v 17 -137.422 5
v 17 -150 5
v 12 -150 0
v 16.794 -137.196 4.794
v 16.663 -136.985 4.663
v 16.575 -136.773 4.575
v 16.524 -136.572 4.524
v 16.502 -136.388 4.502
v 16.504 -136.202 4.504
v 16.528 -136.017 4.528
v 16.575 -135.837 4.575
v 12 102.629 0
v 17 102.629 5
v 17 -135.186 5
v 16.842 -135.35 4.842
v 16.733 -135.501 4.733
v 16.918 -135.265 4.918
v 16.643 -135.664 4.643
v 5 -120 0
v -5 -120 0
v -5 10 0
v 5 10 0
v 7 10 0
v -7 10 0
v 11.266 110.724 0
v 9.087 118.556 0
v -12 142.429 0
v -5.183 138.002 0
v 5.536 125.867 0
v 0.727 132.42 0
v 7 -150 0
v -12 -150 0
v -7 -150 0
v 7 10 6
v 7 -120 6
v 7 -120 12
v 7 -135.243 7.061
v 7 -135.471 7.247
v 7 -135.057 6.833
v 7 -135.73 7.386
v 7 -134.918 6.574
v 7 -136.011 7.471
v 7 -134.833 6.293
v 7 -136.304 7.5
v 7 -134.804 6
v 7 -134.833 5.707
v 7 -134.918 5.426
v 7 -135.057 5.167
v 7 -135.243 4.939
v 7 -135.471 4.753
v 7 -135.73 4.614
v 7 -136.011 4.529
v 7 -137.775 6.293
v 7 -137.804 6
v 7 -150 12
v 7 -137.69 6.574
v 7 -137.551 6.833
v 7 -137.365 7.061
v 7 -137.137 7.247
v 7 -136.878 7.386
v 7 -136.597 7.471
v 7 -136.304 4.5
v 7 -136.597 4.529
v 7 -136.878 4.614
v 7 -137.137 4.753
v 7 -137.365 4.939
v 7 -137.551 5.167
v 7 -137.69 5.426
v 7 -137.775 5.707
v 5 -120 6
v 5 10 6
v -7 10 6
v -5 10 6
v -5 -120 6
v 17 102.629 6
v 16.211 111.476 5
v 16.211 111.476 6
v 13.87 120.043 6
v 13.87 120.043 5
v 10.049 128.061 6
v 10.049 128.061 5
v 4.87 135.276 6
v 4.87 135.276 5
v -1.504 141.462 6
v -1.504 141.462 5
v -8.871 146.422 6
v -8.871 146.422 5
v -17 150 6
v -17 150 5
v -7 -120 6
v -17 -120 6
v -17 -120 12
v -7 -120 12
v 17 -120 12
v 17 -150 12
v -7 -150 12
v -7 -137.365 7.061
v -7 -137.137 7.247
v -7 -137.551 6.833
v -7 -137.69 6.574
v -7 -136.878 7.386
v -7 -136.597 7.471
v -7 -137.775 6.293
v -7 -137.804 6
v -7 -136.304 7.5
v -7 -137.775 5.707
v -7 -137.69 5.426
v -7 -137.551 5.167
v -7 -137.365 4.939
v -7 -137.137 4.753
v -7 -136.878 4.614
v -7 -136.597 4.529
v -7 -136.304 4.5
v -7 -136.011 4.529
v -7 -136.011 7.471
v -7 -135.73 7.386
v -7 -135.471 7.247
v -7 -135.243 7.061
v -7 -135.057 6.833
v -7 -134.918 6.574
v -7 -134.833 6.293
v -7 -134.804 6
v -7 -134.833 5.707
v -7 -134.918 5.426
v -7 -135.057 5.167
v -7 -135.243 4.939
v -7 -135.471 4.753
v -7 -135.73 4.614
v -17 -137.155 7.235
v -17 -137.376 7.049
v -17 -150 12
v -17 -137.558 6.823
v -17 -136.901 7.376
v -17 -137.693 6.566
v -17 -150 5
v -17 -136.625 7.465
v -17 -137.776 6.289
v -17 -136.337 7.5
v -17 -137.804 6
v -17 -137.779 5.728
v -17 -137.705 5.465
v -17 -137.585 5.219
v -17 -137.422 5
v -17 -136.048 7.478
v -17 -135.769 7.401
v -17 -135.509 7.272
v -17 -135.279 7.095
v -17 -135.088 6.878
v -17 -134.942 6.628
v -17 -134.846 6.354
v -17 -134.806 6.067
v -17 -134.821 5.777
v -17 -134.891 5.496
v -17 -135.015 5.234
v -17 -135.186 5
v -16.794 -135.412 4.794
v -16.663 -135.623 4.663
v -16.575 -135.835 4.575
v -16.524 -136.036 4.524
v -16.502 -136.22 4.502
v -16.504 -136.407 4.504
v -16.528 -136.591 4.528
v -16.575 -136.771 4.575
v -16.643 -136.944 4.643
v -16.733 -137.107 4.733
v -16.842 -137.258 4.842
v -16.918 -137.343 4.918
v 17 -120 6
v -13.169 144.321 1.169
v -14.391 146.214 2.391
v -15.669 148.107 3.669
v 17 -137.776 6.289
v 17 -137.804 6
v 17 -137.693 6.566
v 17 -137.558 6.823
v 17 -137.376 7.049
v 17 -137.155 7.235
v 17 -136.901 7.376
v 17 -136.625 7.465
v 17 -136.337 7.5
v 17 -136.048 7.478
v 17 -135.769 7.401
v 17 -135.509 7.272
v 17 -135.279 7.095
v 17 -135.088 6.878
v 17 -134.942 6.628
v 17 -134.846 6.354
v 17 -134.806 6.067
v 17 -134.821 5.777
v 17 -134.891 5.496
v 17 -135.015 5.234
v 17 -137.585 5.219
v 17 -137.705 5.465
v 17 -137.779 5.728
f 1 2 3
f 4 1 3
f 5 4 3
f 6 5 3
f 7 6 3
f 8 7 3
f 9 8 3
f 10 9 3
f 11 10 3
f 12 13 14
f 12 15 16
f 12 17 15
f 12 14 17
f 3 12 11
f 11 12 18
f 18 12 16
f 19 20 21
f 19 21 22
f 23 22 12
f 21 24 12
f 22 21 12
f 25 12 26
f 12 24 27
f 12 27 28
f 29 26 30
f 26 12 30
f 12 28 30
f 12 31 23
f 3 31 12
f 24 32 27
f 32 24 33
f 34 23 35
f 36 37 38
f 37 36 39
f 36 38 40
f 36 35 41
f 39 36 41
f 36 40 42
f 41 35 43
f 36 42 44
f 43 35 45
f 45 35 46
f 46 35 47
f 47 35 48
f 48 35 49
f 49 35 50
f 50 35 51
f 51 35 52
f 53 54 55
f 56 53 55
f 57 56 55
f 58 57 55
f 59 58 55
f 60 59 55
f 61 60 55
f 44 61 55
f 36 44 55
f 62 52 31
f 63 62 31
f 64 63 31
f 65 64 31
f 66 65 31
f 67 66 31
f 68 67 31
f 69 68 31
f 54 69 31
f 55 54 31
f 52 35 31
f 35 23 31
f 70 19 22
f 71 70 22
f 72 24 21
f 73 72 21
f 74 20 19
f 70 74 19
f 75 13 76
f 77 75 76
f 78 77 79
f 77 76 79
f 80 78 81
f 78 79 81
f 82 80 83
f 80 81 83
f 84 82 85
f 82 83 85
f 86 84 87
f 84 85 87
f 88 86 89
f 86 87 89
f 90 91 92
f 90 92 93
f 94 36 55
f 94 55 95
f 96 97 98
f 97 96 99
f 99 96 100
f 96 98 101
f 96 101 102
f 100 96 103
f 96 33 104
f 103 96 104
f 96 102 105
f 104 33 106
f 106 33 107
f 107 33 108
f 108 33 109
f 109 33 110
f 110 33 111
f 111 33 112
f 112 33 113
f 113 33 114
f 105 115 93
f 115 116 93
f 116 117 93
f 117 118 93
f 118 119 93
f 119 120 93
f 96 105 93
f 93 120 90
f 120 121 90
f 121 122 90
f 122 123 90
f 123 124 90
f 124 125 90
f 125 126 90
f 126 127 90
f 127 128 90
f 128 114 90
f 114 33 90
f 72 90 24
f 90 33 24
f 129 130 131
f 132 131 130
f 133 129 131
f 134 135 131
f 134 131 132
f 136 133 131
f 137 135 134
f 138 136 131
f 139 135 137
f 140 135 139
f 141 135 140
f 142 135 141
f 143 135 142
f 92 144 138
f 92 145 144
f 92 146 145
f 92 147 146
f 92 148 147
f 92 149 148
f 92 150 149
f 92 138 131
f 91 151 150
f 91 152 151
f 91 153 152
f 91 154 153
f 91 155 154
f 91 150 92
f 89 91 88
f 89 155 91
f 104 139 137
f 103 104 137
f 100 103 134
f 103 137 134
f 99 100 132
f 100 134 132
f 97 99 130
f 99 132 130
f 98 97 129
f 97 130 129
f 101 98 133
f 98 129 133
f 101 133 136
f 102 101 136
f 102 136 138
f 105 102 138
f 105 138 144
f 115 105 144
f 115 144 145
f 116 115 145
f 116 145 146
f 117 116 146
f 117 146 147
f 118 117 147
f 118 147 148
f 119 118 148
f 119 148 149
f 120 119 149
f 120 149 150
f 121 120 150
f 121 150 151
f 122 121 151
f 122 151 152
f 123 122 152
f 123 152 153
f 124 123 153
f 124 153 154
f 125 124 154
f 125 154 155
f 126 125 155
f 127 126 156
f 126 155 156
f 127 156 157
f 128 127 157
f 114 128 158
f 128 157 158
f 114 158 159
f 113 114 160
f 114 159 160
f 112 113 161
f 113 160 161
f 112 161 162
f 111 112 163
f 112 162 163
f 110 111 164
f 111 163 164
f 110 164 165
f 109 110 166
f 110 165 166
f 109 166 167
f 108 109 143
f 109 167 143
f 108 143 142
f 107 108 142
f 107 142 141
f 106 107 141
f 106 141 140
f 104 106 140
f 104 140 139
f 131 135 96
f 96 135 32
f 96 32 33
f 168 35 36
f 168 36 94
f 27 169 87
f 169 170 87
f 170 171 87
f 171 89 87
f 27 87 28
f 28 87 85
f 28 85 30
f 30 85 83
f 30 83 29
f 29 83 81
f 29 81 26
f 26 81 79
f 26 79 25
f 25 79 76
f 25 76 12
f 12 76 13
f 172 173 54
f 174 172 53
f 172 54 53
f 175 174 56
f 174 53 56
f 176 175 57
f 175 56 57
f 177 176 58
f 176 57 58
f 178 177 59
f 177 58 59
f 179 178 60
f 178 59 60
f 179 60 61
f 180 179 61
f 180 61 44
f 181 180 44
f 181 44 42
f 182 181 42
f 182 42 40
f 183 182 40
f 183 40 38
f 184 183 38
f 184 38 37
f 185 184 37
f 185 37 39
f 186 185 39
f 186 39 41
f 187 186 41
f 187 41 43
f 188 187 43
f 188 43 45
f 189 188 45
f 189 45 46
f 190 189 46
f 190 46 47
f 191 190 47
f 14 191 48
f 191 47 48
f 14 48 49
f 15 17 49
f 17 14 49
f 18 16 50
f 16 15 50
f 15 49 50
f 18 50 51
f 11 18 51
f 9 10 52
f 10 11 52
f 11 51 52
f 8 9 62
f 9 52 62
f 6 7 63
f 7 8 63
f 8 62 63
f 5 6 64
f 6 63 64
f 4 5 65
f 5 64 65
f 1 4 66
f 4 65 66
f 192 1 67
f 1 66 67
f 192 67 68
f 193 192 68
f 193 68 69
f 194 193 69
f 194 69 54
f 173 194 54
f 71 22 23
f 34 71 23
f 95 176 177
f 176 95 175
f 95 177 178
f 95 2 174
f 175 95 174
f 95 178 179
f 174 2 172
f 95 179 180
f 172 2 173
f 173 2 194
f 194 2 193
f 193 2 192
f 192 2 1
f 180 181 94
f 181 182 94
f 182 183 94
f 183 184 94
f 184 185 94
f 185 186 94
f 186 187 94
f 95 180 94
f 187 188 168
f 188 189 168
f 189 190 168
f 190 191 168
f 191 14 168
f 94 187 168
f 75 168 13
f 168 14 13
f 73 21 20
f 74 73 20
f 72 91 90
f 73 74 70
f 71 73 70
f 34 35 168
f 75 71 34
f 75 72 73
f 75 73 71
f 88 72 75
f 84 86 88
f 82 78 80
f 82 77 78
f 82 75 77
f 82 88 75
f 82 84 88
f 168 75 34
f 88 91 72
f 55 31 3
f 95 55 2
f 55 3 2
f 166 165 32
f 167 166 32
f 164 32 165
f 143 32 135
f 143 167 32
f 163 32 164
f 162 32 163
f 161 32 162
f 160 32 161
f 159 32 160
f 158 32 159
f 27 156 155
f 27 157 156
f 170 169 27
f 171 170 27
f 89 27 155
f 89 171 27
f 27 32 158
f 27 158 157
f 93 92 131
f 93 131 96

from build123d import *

# Parameters (mm, degrees)
F1_DEPTH    = 6
F2_W        = 10
F2_H        = 30
F3_DEPTH    = 6
F4_R        = 1.5
F5_DEPTH    = 34.001
F6_T1_DEPTH = 242.8543856465
F7_T1_DEPTH = 325.7168298797
F7_T3_DEPTH = 265.4875378105
F7_T6_ANGLE = 86.0754516161


# Not quite as in the source:
# - a fillet or chamfer that OpenCascade refuses, or shapes differently, is made with other operations: its cross-section is extruded or revolved along the edge and cut away or added


with BuildPart() as f1:
    # F0 (on Top) → F1 (new body)
    with BuildSketch(Plane.XY):
        Polygon((7, -150), (17, -150), (17, 150), (-17, 150), (-17, -150), (-7, -150), (-7, 10), (-5, 10), (-5, -120), (5, -120), (5, 10), (7, 10), align=None)
    extrude(amount=F1_DEPTH)

    # F2 (on face) → F3 (join)
    with BuildSketch(Plane.XY.offset(6)):
        with Locations((-12, -135)):
            Rectangle(F2_W, F2_H)
        with Locations((12, -135)):
            Rectangle(F2_W, F2_H)
    extrude(amount=F3_DEPTH)

    # F4 (on face) → F5 (cut, through all)
    with BuildSketch(Plane(origin=(-17, 0, 0), x_dir=(0, -1, 0), z_dir=(-1, 0, 0))):
        with Locations((136.3040655851, 6)):
            Circle(F4_R)
    extrude(amount=-F5_DEPTH, mode=Mode.SUBTRACT)

    # F6: fillet of radius 50 on 1 edges, made by hand

    # F6_s2 → F6_t1 (cut)
    with BuildSketch(Plane.XY.offset(-118.4271928233)):
        with BuildLine():
            ThreePointArc((17, 102.6291228707), (7.6201920232, 131.7838823449), (-17, 150))
            Line((-17, 150), (17, 150))
            Line((17, 150), (17, 102.6291228707))
        make_face()
    extrude(amount=F6_T1_DEPTH, mode=Mode.SUBTRACT)

    # F7: chamfer of 5 on 3 edges, made by hand

    # F7_s2 → F7_t1 (cut)
    with BuildSketch(Plane.XZ.offset(-162.8584149398)):
        Polygon((-12, 0), (-17, 5), (-17, 0), align=None)
    extrude(amount=F7_T1_DEPTH, mode=Mode.SUBTRACT)

    # F7_s4 → F7_t3 (cut)
    with BuildSketch(Plane.XZ.offset(-102.6291228707)):
        Polygon((17, 5), (12, 0), (17, 0), align=None)
    extrude(amount=F7_T3_DEPTH, mode=Mode.SUBTRACT)

    # F7_s5 → F7_t6 (revolve, cut)
    with BuildSketch(Plane(origin=(-39.8531616504, 2.7340709455, 0), x_dir=(0, 0, 1), z_dir=(-0.9976550461, 0.0684427424, 0))):
        Polygon((0, 145.1298518112), (5, 150.1298518112), (0, 150.1298518112), align=None)
    revolve(axis=Axis((-33, 102.6291228707, 0), (0, 0, -1)), revolution_arc=F7_T6_ANGLE, mode=Mode.SUBTRACT)


solid = f1.part
